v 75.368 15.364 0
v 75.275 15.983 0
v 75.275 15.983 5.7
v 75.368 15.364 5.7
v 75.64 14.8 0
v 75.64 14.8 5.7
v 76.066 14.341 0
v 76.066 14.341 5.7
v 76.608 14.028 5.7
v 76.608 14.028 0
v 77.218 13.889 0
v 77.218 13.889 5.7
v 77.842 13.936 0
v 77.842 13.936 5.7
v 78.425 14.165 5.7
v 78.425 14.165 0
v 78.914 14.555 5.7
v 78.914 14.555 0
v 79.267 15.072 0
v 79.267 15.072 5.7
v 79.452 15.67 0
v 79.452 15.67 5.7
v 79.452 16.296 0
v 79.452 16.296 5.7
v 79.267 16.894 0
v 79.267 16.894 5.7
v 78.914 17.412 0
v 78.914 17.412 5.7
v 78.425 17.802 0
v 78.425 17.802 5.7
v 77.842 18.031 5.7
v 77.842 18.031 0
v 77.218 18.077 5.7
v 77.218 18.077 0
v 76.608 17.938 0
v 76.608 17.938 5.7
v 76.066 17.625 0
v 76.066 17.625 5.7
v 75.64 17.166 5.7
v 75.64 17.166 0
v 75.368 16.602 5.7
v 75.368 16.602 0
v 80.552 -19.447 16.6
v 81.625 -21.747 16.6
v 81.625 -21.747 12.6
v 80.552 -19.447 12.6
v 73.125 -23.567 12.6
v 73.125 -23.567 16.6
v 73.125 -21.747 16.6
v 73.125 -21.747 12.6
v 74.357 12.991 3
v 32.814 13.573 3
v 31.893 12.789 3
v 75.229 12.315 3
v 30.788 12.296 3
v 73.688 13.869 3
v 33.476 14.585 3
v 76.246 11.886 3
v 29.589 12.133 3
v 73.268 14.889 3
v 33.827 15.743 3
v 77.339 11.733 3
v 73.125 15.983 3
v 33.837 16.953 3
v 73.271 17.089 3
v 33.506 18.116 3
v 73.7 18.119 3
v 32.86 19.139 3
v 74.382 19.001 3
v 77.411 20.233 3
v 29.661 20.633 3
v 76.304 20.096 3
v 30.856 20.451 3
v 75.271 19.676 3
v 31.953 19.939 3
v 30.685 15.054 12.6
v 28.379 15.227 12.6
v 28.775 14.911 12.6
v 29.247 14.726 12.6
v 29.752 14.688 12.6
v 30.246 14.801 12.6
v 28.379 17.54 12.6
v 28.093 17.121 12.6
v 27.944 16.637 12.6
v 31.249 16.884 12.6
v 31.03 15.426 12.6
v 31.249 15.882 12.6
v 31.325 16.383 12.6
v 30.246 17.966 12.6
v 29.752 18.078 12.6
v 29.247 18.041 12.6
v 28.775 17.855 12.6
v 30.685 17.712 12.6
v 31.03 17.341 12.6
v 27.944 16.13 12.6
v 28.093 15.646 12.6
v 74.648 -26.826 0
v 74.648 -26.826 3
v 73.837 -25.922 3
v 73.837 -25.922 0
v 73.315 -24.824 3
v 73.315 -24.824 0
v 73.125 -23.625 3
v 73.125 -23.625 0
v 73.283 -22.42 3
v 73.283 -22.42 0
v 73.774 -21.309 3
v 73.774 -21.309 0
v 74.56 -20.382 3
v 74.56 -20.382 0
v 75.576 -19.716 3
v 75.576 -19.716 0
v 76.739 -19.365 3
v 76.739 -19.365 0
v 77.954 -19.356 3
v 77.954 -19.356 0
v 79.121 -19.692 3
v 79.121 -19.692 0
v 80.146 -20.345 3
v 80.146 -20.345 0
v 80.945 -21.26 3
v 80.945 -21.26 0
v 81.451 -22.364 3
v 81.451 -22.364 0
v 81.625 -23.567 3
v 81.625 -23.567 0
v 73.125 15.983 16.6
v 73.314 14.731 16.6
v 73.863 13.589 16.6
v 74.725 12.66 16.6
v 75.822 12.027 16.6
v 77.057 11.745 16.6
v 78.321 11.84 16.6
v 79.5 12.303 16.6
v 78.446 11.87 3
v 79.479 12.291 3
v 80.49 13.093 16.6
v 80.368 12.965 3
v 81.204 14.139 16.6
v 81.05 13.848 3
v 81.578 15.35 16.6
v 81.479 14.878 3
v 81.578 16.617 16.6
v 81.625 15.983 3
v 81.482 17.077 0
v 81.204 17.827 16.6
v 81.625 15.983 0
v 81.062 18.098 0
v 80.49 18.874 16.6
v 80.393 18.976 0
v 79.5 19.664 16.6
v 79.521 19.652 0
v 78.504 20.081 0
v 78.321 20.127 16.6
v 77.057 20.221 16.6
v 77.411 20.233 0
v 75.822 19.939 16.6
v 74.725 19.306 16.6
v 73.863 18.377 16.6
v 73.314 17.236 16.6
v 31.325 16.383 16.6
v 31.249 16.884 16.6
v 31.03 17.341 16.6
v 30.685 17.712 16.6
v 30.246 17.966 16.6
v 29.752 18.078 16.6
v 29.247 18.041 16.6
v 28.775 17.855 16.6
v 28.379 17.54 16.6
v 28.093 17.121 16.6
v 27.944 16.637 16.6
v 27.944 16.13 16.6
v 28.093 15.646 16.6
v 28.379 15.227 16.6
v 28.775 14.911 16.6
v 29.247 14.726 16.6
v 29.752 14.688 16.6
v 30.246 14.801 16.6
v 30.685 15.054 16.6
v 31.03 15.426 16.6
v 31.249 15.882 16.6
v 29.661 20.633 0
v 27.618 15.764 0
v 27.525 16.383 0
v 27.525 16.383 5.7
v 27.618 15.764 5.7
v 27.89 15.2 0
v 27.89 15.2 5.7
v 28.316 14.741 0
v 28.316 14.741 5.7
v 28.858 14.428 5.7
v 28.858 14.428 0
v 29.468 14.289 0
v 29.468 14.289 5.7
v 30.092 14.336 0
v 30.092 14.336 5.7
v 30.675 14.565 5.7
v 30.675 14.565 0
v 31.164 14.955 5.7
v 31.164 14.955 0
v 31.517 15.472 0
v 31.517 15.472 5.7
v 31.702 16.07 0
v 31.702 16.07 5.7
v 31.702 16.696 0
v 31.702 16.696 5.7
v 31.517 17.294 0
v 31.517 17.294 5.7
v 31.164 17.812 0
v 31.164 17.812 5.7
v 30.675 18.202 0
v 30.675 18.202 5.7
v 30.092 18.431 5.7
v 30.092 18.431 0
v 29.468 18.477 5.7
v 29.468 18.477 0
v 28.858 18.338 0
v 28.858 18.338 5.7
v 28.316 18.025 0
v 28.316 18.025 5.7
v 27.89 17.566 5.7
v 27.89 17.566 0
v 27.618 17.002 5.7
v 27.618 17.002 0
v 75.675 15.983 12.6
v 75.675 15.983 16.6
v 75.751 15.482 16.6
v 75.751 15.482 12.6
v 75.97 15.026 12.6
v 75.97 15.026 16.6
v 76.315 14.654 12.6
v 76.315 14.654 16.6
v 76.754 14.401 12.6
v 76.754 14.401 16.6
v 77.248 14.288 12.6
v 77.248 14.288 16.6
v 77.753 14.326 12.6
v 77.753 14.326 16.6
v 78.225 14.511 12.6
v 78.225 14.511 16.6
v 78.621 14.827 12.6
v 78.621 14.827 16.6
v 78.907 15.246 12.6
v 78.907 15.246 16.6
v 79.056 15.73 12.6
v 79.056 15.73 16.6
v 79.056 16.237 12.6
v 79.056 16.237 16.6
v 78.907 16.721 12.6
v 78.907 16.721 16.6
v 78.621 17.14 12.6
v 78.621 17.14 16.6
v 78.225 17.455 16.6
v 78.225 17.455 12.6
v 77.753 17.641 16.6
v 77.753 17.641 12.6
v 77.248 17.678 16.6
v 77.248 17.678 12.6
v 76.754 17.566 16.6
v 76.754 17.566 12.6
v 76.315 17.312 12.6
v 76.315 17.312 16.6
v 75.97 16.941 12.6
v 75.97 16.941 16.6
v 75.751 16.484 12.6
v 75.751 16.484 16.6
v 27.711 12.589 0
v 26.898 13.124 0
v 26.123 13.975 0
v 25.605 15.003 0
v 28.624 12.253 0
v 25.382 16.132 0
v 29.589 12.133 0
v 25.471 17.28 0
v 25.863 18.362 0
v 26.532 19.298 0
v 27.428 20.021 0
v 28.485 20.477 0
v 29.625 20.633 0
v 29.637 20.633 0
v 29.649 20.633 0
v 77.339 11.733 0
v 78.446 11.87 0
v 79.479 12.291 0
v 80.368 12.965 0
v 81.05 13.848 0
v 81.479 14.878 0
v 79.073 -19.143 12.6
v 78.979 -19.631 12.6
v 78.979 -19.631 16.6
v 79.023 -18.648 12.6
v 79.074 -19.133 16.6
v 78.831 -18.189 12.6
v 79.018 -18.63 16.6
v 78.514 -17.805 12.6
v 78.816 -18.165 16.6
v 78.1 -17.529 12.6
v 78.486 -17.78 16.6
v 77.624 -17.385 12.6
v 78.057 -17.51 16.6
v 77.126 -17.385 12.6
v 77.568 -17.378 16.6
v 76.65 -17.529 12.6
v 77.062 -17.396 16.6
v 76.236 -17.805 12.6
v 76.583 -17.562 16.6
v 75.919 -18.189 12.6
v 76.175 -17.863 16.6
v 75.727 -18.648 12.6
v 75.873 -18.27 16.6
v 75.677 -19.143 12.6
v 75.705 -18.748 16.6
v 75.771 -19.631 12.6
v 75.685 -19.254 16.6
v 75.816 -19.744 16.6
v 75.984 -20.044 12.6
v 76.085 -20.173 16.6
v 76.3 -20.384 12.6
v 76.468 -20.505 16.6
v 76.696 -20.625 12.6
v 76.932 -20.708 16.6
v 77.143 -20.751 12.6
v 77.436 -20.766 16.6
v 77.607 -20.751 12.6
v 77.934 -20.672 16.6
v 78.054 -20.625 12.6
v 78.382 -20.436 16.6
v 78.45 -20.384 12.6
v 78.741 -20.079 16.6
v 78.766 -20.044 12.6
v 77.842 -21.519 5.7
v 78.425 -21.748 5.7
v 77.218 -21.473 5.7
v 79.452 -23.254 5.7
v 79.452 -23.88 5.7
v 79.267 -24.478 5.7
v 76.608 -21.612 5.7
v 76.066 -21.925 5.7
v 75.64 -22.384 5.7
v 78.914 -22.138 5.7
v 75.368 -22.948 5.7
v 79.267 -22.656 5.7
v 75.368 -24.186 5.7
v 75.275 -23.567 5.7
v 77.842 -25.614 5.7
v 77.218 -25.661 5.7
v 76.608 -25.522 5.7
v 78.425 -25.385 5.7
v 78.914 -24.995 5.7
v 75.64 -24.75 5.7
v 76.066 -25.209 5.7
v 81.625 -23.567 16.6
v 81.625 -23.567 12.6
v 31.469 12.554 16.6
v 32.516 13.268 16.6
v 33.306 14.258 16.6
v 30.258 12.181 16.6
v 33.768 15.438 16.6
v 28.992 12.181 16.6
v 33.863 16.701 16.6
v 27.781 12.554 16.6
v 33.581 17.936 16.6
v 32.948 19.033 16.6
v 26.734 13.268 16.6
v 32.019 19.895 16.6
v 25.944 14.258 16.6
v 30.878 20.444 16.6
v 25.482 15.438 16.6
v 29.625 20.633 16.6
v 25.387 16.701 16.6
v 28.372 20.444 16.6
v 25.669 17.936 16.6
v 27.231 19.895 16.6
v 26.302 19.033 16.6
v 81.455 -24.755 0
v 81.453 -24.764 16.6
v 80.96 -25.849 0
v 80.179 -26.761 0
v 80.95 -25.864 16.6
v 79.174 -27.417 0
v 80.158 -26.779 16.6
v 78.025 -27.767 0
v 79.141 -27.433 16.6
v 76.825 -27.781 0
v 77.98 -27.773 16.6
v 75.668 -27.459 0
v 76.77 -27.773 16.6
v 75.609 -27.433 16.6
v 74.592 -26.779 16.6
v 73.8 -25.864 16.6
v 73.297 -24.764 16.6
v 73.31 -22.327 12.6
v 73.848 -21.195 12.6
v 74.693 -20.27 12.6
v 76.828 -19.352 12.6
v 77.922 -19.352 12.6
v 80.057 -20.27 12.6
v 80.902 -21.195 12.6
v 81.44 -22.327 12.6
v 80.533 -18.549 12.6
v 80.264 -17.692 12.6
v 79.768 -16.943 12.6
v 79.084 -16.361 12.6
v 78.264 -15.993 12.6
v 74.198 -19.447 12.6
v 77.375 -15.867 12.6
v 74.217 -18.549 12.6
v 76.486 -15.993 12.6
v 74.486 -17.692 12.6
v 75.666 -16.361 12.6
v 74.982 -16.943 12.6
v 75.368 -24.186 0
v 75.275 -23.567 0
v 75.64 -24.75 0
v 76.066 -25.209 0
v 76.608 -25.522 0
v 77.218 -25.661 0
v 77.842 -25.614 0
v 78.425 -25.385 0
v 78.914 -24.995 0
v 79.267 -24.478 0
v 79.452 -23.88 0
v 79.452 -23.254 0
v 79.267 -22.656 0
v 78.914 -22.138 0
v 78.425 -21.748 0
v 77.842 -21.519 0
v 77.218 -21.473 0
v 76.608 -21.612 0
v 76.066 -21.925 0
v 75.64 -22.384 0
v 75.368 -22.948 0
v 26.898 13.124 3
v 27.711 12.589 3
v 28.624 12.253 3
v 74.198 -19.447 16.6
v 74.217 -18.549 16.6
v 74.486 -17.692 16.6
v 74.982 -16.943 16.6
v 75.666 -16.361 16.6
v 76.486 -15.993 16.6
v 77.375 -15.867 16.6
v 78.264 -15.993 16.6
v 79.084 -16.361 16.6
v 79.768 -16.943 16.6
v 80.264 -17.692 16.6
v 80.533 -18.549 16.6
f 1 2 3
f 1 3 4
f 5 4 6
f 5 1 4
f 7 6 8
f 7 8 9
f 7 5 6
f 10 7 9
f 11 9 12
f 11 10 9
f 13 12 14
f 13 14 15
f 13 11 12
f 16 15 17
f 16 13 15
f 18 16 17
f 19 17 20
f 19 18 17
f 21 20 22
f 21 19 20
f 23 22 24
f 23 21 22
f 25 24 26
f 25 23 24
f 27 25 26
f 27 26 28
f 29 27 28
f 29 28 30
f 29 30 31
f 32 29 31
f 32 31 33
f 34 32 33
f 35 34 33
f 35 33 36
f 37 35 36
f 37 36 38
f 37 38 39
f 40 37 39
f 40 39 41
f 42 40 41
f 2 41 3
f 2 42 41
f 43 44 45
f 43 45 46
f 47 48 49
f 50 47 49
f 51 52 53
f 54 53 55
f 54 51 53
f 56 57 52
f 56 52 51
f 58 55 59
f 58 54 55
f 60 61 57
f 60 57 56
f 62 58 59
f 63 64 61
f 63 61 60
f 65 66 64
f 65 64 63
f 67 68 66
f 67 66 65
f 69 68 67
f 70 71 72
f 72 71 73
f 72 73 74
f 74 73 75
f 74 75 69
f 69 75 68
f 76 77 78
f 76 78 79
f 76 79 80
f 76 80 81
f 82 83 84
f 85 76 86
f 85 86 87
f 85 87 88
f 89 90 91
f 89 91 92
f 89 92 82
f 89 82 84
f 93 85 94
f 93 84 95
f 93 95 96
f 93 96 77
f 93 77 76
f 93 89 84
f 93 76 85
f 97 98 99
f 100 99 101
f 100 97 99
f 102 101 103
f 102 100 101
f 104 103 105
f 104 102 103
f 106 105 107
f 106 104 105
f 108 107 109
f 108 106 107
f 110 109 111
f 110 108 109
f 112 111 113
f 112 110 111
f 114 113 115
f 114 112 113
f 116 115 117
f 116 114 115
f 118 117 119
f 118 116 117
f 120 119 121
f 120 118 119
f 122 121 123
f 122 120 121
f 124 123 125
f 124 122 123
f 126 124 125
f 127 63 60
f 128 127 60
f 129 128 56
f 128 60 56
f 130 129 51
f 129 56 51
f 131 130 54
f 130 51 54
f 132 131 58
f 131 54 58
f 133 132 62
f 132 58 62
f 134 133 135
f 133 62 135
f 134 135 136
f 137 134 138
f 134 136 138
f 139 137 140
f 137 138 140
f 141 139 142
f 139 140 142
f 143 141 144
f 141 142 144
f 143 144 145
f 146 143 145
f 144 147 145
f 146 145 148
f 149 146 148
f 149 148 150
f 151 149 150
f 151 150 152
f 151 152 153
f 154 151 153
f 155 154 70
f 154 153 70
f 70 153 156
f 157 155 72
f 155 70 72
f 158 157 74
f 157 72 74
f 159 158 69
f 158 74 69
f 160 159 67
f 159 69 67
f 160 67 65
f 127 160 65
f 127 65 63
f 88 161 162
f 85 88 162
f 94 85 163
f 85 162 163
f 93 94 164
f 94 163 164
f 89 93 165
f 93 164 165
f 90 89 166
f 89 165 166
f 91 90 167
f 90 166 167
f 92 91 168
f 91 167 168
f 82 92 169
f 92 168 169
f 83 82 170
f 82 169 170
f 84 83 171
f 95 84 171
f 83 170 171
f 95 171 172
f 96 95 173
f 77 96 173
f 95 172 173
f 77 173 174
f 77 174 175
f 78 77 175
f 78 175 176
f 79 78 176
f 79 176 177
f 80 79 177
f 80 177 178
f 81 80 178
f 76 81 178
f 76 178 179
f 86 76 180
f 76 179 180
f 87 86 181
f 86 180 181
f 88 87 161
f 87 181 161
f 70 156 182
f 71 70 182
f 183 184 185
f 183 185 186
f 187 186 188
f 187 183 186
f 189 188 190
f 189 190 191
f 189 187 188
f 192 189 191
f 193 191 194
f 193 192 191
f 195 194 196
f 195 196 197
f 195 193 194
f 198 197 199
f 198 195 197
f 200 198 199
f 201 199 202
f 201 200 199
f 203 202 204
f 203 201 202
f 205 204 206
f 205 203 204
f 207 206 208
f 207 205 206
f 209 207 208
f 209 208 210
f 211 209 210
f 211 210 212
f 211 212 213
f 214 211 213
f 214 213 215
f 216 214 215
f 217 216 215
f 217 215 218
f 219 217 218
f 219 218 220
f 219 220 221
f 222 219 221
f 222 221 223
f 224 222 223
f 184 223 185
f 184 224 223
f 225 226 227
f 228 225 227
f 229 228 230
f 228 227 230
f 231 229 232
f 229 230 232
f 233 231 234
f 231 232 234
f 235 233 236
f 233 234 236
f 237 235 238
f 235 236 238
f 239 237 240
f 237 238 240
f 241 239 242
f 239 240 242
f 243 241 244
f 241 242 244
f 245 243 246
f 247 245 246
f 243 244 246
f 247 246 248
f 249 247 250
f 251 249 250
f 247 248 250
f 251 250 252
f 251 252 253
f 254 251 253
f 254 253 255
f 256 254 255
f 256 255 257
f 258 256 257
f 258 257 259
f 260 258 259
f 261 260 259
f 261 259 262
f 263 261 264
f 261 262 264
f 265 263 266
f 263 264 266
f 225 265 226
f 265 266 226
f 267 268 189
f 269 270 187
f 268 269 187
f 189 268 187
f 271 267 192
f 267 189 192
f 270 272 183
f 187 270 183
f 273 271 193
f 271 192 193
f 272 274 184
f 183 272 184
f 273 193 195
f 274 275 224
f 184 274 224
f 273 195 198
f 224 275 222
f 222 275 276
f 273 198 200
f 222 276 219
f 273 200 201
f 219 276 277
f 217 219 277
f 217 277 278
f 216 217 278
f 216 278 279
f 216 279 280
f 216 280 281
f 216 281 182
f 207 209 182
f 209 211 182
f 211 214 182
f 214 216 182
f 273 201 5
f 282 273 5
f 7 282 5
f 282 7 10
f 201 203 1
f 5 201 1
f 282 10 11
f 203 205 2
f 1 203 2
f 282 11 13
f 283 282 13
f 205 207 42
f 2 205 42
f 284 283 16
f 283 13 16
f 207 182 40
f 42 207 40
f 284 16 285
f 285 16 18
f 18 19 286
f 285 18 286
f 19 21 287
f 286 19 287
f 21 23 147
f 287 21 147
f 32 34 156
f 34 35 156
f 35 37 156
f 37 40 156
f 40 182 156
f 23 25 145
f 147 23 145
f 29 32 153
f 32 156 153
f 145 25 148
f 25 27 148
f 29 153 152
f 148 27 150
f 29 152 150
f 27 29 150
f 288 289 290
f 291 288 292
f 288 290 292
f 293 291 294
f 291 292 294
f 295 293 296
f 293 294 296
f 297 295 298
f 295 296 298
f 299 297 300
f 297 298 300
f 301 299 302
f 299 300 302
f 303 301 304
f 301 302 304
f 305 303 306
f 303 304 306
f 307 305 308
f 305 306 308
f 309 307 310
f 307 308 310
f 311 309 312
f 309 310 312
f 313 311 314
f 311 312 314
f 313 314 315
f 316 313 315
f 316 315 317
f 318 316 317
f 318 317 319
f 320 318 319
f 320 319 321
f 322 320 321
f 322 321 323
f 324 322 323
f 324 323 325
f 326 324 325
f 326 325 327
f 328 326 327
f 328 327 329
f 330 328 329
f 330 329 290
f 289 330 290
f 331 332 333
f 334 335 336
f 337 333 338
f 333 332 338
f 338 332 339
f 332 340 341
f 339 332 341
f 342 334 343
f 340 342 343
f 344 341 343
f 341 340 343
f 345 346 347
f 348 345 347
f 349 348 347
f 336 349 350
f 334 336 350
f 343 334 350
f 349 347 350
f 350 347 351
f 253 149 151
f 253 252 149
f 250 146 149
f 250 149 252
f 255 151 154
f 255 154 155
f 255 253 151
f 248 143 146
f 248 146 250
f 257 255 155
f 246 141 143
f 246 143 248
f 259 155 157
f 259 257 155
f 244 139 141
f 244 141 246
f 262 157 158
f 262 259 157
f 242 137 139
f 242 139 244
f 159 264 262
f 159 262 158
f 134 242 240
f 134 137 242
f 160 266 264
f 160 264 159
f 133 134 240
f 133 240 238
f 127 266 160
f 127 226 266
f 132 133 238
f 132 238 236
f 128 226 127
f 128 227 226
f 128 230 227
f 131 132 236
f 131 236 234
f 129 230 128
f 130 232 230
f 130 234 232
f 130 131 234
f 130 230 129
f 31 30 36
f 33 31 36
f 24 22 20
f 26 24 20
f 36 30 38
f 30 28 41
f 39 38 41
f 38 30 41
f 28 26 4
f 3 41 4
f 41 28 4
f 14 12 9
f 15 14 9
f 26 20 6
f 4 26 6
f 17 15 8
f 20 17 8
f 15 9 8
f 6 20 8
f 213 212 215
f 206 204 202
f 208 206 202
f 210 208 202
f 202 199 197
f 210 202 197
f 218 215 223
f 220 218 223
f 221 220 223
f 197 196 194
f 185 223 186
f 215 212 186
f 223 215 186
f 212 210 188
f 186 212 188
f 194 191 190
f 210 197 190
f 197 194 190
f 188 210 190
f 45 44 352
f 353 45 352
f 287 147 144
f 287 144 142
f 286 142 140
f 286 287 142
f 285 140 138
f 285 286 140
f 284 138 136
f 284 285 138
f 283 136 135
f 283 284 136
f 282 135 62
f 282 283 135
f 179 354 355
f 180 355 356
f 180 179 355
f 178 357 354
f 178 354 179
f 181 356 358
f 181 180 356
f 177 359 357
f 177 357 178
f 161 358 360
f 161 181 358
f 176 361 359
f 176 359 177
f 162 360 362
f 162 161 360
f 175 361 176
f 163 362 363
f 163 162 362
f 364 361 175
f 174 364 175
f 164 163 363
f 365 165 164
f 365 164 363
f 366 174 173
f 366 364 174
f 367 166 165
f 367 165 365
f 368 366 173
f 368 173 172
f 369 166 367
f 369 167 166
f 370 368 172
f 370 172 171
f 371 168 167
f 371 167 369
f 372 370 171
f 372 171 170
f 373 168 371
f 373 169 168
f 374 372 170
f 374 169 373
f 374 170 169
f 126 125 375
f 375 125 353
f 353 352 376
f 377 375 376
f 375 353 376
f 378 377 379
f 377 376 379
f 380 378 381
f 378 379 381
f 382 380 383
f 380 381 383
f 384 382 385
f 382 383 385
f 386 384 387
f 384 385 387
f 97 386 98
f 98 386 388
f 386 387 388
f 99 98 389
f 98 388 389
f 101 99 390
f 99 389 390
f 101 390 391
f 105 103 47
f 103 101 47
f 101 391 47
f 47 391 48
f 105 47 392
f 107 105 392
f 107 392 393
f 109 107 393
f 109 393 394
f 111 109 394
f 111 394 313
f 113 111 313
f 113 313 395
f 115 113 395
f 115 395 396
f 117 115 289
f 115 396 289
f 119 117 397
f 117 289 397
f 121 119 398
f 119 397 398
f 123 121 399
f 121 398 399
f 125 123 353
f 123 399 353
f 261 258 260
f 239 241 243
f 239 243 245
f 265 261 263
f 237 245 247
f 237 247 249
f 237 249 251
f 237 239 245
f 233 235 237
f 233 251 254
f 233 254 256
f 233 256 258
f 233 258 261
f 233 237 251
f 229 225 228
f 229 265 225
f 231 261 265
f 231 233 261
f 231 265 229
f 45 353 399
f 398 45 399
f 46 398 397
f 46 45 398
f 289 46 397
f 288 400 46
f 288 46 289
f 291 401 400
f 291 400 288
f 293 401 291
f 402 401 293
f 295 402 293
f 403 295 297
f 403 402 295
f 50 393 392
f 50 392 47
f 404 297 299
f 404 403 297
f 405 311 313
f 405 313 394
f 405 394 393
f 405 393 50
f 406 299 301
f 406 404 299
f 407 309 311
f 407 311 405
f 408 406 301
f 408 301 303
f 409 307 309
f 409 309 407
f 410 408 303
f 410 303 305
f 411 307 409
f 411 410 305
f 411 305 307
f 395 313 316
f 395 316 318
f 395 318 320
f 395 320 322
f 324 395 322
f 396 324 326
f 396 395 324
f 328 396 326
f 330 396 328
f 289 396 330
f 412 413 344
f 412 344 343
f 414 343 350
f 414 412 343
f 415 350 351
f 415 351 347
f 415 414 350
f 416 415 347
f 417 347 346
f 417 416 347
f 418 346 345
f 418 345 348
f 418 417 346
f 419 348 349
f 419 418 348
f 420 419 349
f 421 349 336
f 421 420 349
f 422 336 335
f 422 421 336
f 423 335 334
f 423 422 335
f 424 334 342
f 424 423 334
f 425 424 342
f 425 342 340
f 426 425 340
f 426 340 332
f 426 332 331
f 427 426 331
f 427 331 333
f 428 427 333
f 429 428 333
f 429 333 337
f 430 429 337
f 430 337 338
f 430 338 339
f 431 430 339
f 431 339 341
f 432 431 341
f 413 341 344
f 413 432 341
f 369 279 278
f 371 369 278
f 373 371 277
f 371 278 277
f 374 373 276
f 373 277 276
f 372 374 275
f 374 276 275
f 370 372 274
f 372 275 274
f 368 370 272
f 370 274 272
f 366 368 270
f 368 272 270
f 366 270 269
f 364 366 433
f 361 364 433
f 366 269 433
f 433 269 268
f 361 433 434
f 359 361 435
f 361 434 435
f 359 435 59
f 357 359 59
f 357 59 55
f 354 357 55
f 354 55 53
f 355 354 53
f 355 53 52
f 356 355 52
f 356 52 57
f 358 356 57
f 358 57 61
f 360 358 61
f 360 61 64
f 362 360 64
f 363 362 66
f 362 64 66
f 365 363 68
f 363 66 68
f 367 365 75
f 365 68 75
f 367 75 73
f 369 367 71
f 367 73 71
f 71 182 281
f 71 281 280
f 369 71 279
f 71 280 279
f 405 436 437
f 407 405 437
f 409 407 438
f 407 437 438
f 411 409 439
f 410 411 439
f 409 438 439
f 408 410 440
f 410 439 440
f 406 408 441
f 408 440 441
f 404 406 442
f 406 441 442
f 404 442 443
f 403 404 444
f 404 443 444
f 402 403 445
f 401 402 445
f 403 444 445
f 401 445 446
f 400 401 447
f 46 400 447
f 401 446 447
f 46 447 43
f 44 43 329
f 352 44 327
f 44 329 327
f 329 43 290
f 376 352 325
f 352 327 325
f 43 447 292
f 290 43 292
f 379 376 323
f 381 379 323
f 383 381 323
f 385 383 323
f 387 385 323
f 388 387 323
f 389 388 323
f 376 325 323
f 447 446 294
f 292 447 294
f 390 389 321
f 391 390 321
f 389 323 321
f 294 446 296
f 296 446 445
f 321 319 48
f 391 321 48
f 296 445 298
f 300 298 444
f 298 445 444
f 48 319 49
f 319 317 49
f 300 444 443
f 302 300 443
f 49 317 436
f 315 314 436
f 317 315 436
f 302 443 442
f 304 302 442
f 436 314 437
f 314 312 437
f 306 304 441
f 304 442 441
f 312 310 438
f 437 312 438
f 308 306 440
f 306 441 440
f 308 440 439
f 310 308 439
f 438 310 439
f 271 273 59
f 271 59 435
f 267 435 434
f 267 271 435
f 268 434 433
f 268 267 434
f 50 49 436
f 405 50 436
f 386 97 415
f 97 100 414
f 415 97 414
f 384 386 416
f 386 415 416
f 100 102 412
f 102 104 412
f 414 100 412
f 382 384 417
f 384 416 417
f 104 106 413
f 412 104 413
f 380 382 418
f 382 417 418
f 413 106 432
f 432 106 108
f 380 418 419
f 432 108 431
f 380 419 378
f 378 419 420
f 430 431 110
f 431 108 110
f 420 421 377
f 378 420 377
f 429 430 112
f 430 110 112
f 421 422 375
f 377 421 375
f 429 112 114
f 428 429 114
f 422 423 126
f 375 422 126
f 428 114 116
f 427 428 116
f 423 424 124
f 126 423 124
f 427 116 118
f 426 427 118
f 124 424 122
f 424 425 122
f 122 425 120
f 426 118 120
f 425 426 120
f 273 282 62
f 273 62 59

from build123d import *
from build123d.topology import SkipClean

# Parameters (mm, degrees)
SKIZZE1_R                         = 4.25
AUFSATZ_LINEAR_AUSTRAGEN1_DEPTH   = 16.6
AUFSATZ_LINEAR_AUSTRAGEN1_2_DEPTH = 16.6
AUFSATZ_LINEAR_AUSTRAGEN1_3_DEPTH = 16.6
SKIZZE2_R                         = 4.25
SCHNITT_LINEAR_AUSTRAGEN1_DEPTH   = 12.6
AUFSATZ_LINEAR_AUSTRAGEN2_DEPTH   = 4
SKIZZE4_R                         = 4.25
AUFSATZ_LINEAR_AUSTRAGEN3_DEPTH   = 16.6
AUFSATZ_LINEAR_AUSTRAGEN4_DEPTH   = 3
SKIZZE6_W                         = 8.5
SKIZZE6_H                         = 39.55
AUFSATZ_LINEAR_AUSTRAGEN5_DEPTH   = 3
AUFSATZ_LINEAR_AUSTRAGEN6_DEPTH   = 3
SKIZZE8_R                         = 1.7
SCHNITT_LINEAR_AUSTRAGEN2_DEPTH   = 4
SCHNITT_LINEAR_START              = -16.6
SKIZZE9_R                         = 2.1
SCHNITT_LINEAR_AUSTRAGEN3_DEPTH   = 5.7
SCHNITT_LINEAR_START_2            = -3
SCHNITT_LINEAR_AUSTRAGEN4_DEPTH   = 3
SCHNITT_LINEAR_AUSTRAGEN5_DEPTH   = 88.817835296
FASE1_SIZE                        = 2.680633651
FASE1_SIZE_2                      = 1.25


with BuildPart() as part:
    # Skizze1 → Aufsatz-Linear austragen1 (new body)
    with BuildSketch(Plane.XY):
        with Locations(Location((29.625, 16.383250172, 0), (0, 0, 90))):
            Circle(SKIZZE1_R)
    extrude(amount=AUFSATZ_LINEAR_AUSTRAGEN1_DEPTH)



with BuildPart() as body_2:
    # Skizze1 → Aufsatz-Linear austragen1 2 (new body)
    with BuildSketch(Plane.XY):
        with Locations(Location((77.375, 15.983250172, 0), (0, 0, 180))):
            Circle(SKIZZE1_R)
    extrude(amount=AUFSATZ_LINEAR_AUSTRAGEN1_2_DEPTH)


with BuildPart() as body_3:
    # Skizze1 → Aufsatz-Linear austragen1 3 (new body)
    with BuildSketch(Plane.XY):
        with Locations(Location((77.375, -19.066749828, 0), (0, 0, 90))):
            Circle(SKIZZE1_R)
    extrude(amount=AUFSATZ_LINEAR_AUSTRAGEN1_3_DEPTH)

    # Skizze2 → Schnitt-Linear austragen1 (cut)
    with BuildSketch(Plane.XY):
        with Locations(Location((77.375, -19.066749828, 0), (0, 0, 90))):
            Circle(SKIZZE2_R)
    extrude(amount=SCHNITT_LINEAR_AUSTRAGEN1_DEPTH, mode=Mode.SUBTRACT)

    # Skizze3 → Aufsatz-Linear austragen2 (add)
    with BuildSketch(Plane.XY.offset(16.6)):
        with BuildLine():
            Line((81.625, -19.066749828), (81.625, -23.566749828))
            ThreePointArc((81.625, -23.566749828), (77.375, -27.816749828), (73.125, -23.566749828))
            Line((73.125, -23.566749828), (73.125, -19.066749828))
            ThreePointArc((73.125, -19.066749828), (77.375, -14.816749828), (81.625, -19.066749828))
        make_face()
    extrude(amount=-AUFSATZ_LINEAR_AUSTRAGEN2_DEPTH)

    # Skizze4 → Aufsatz-Linear austragen3 (add)
    with BuildSketch(Plane.XY.offset(16.6)):
        with Locations((77.375, -23.566749828)):
            Circle(SKIZZE4_R)
    extrude(amount=-AUFSATZ_LINEAR_AUSTRAGEN3_DEPTH)


with BuildPart() as part_1:
    add(part.part)

    add(body_3.part)  # Aufsatz-Linear austragen4 merges body 3
    # Skizze5 → Aufsatz-Linear austragen4 (add)
    with BuildSketch(Plane.XY):
        Polygon((26.897842702, 13.123631624), (74.647842702, -26.826368376), (80.102157298, -20.307131281), (32.352157298, 19.642868719), align=None)
    extrude(amount=AUFSATZ_LINEAR_AUSTRAGEN4_DEPTH)


    add(body_2.part)  # Aufsatz-Linear austragen5 merges body 2
    # Skizze6 → Aufsatz-Linear austragen5 (add)
    with BuildSketch(Plane(origin=(0, 0, 0), x_dir=(-1, 0, 0), z_dir=(0, 0, -1))):
        with Locations((-77.375, -3.791749828)):
            Rectangle(SKIZZE6_W, SKIZZE6_H)
    extrude(amount=-AUFSATZ_LINEAR_AUSTRAGEN5_DEPTH)

    # Skizze7 → Aufsatz-Linear austragen6 (add)
    with BuildSketch(Plane(origin=(0, 0, 0), x_dir=(-1, 0, 0), z_dir=(0, 0, -1))):
        Polygon((-77.410600845, 20.233101061), (-29.660600845, 20.633101061), (-29.589399155, 12.133399283), (-77.339399155, 11.733399283), align=None)
    extrude(amount=-AUFSATZ_LINEAR_AUSTRAGEN6_DEPTH)

    # Skizze8 → Schnitt-Linear austragen2 (cut)
    with BuildSketch(Plane.XY.offset(16.6)):
        with Locations((29.625, 16.383250172)):
            Circle(SKIZZE8_R)
        with Locations(Location((77.375, -19.066749828, 0), (0, 0, 340.618124407))):
            Circle(SKIZZE8_R)
        with Locations(Location((77.375, 15.983250172, 0), (0, 0, 180))):
            Circle(SKIZZE8_R)
    extrude(amount=-SCHNITT_LINEAR_AUSTRAGEN2_DEPTH, mode=Mode.SUBTRACT)

    # Skizze9 → Schnitt-Linear austragen3 (cut)
    with BuildSketch(Plane.XY.offset(16.6).offset(SCHNITT_LINEAR_START)):
        with Locations(Location((29.625, 16.383250172, 0), (0, 0, 180))):
            Circle(SKIZZE9_R)
        with Locations(Location((77.375, -23.566749828, 0), (0, 0, 180))):
            Circle(SKIZZE9_R)
        with Locations(Location((77.375, 15.983250172, 0), (0, 0, 180))):
            Circle(SKIZZE9_R)
    extrude(amount=SCHNITT_LINEAR_AUSTRAGEN3_DEPTH, mode=Mode.SUBTRACT)

    # Skizze11 → Schnitt-Linear austragen4 (cut)
    with SkipClean():  # the faces are left unmerged after this step: merging them gives an invalid solid
        with BuildSketch(Plane.XY.offset(3).offset(SCHNITT_LINEAR_START_2)):
            with BuildLine():
                Line((26.897842702, 13.123631624), (74.647842702, -26.826368376))
                ThreePointArc((74.647842702, -26.826368376), (75.57610013, -19.716235673), (81.625, -23.566749828))
                Line((81.625, -23.566749828), (81.625, 15.983250172))
                ThreePointArc((81.625, 15.983250172), (80.367590551, 12.965485801), (77.339399155, 11.733399283))
                Line((77.339399155, 11.733399283), (29.589399155, 12.133399283))
                ThreePointArc((29.589399155, 12.133399283), (28.157570901, 12.394622358), (26.897842702, 13.123631624))
            make_face()
        extrude(amount=SCHNITT_LINEAR_AUSTRAGEN4_DEPTH, mode=Mode.SUBTRACT)


with BuildPart() as schnitt_linear_austragen4_piece_1:
    # of the separate pieces the step leaves, piece 1, a body of its own (schnitt_linear_austragen4_pieces)
    add(part_1.part.solids().sort_by_distance((41.446525663, 12.034072568, 3))[0])


with BuildPart() as schnitt_linear_austragen4_piece_2:
    # of the separate pieces the step leaves, piece 2, a body of its own (schnitt_linear_austragen4_pieces)
    add(part_1.part.solids().sort_by_distance((73.125, -19.066749828, 16.6))[0])

    # Skizze12 → Schnitt-Linear austragen5 (cut, through all)
    with SkipClean():  # the faces are left unmerged after this step: merging them gives an invalid solid
        with BuildSketch(Plane.XY.offset(16.6)):
            with BuildLine():
                Line((73.125, -19.066749828), (74.175, -19.066749828))
                ThreePointArc((74.175, -19.066749828), (77.375, -15.866749828), (80.575, -19.066749828))
                Line((80.575, -19.066749828), (81.625, -19.066749828))
                ThreePointArc((81.625, -19.066749828), (77.375, -14.816749828), (73.125, -19.066749828))
            make_face()
        extrude(amount=-SCHNITT_LINEAR_AUSTRAGEN5_DEPTH, mode=Mode.SUBTRACT)

    # Fase1
    # the kernel refuses this chamfer: 2.680633651, 1.25 mm, written as the material it takes off along each edge
    with BuildSketch(Plane(origin=(73.125, -19.066749828, 23.545456037), x_dir=(-0.016311164131098583, -0.9998669641130706, 0), z_dir=(0, 0, -1))) as fase1_piece_1_section:
        Polygon((FASE1_SIZE * 0.999866963978, -FASE1_SIZE * 0.0163111641289), (-FASE1_SIZE_2 * 0.0163111641311, -FASE1_SIZE_2 * 0.999866964113), (0, 0), align=None)
    fase1_piece_1 = extrude(amount=17.890912073, mode=Mode.PRIVATE)
    fase1_piece_1 = fase1_piece_1 - Plane(origin=(77.375, -19.066749828, 14.6), x_dir=(-1, 0, 0), z_dir=(0, 0, 1)) * Cylinder(3.2, 47, mode=Mode.PRIVATE)
    add(fase1_piece_1, mode=Mode.SUBTRACT)
    with BuildSketch(Plane(origin=(81.625, -19.066749828, 23.545456037), x_dir=(0.01631116413110359, -0.9998669641130705, 0), z_dir=(0, 0, -1))) as fase1_piece_2_section:
        Polygon((FASE1_SIZE * 0.999866963978, FASE1_SIZE * 0.0163111641289), (-FASE1_SIZE_2 * 0.0163111641311, FASE1_SIZE_2 * 0.999866964113), (0, 0), align=None)
    fase1_piece_2 = extrude(amount=17.890912073, mode=Mode.PRIVATE)
    fase1_piece_2 = fase1_piece_2 - Plane(origin=(77.375, -19.066749828, 14.6), x_dir=(-1, 0, 0), z_dir=(0, 0, 1)) * Cylinder(3.2, 47, mode=Mode.PRIVATE)
    add(fase1_piece_2, mode=Mode.SUBTRACT)


solid = Compound([schnitt_linear_austragen4_piece_1.part, schnitt_linear_austragen4_piece_2.part])
